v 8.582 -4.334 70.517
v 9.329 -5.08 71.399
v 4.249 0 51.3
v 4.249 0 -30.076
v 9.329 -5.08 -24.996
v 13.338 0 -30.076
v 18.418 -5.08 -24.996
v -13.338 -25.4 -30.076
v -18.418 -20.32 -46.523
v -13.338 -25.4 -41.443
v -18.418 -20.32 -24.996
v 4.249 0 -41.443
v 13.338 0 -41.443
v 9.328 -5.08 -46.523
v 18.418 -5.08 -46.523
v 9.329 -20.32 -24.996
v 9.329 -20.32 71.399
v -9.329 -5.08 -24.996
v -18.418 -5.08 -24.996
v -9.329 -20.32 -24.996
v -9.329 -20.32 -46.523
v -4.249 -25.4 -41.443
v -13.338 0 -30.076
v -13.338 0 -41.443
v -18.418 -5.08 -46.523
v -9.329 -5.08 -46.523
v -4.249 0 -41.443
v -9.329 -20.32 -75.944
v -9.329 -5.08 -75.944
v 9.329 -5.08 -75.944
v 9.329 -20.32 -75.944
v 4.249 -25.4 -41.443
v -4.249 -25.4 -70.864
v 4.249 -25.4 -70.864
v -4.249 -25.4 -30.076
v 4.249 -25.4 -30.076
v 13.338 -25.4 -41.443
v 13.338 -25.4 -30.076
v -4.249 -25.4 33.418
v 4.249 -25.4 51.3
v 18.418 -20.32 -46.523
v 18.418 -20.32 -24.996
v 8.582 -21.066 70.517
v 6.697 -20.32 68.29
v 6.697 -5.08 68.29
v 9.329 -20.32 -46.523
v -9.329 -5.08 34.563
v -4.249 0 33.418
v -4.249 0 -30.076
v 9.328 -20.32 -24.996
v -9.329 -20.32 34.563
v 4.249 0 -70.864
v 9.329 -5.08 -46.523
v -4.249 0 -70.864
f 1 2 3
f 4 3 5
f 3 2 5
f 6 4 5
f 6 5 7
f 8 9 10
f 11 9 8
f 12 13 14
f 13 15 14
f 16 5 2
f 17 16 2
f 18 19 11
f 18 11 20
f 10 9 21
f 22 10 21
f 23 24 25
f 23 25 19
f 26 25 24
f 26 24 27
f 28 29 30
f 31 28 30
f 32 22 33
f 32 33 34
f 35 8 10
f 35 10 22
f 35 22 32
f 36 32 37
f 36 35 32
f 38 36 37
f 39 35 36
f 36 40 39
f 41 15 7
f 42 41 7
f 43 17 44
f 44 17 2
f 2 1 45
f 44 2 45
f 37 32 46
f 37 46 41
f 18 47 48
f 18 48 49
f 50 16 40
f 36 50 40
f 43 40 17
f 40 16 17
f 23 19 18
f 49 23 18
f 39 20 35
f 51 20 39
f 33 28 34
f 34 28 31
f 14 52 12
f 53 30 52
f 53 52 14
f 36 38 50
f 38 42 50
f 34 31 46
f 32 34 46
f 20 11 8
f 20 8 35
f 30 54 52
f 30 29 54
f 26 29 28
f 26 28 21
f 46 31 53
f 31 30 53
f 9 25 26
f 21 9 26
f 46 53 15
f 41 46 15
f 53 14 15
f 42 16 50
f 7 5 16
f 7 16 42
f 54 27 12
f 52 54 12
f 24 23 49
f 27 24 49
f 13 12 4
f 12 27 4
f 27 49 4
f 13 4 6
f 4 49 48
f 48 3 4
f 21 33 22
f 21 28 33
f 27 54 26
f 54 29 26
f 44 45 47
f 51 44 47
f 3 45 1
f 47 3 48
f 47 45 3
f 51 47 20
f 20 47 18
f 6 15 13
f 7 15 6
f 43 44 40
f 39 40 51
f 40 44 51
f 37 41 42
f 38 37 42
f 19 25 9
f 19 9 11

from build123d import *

# Parameters (mm, degrees)
F0_W        = 9.0893283486
F0_H        = 21.5273555368
F0_W_2      = 9.3285199255
F0_H_2      = 29.4207185507
F1_DEPTH    = 25.4
F2_R        = 9.5587418967
F3_DEPTH    = 25.4
F4_C1_SIZE  = 5.08
F4_C2_SIZE  = 5.08
F4_C3_SIZE  = 5.08
F4_C4_SIZE  = 5.08
F4_C5_SIZE  = 5.08
F4_C6_SIZE  = 5.0799
F4_C7_SIZE  = 5.08
F4_C8_SIZE  = 5.08
F4_C9_SIZE  = 5.08
F4_C10_SIZE = 5.08
F4_C11_SIZE = 5.08
F4_C12_SIZE = 5.08
F5_C1_SIZE  = 5.08
F5_C2_SIZE  = 5.08
F5_C3_SIZE  = 5.08
F5_C4_SIZE  = 5.08
F5_C5_SIZE  = 5.08
F5_C6_SIZE  = 5.08
F5_C7_SIZE  = 5.08
F5_C8_SIZE  = 5.08
F5_C9_SIZE  = 5.08
F5_C10_SIZE = 5.08
F5_C11_SIZE = 5.0799
F5_C12_SIZE = 5.08


# Not quite as in the source:
# - a fillet or chamfer is up to 0.001 mm smaller than in the source, because OpenCascade refuses the exact size


with BuildPart() as f1:
    # F0 (on Front) → F1 (new body)
    with BuildSketch(Plane.XZ):
        with Locations((-13.8731840998, -35.7593270019)):
            Rectangle(F0_W, F0_H)
        Polygon((-9.3285199255, -24.9956492335), (-9.3285199255, -46.5230047703), (0, -46.5230047703), (9.3285199255, -46.5230047703), (9.3285199255, -24.9956492335), (9.3285199255, 34.5633625984), (9.3285199255, 71.3990554214), (6.6973981448, 68.2895556092), (-9.3285199255, 34.5633625984), align=None)
        with Locations((13.8731840998, -35.7593270019)):
            Rectangle(F0_W, F0_H)
        with Locations((-4.6642599627, -61.2333640456)):
            Rectangle(F0_W_2, F0_H_2)
        with Locations((4.6642599627, -61.2333640456)):
            Rectangle(F0_W_2, F0_H_2)
    extrude(amount=F1_DEPTH)

    # F2 (on Front) → F3 (join)
    with BuildSketch(Plane.XZ):
        with Locations((0, -37.1944867074)):
            Circle(F2_R)
    extrude(amount=F3_DEPTH)

    # F4: chamfer of 5.08 on 13 edges, made by hand

    # F4_c1
    f4_c1_edges = [f1.edges().sort_by_distance(p)[0] for p in [
        (-13.8731840998, 0, -46.5230047703),
    ]]
    chamfer(f4_c1_edges, length=F4_C1_SIZE)

    # F4_c2
    f4_c2_edges = [f1.edges().sort_by_distance(p)[0] for p in [
        (-18.4178482741, 0, -33.2193270019),
    ]]
    chamfer(f4_c2_edges, length=F4_C2_SIZE)

    # F4_c3
    f4_c3_edges = [f1.edges().sort_by_distance(p)[0] for p in [
        (-9.3285199255, 0, -61.2333640456),
    ]]
    chamfer(f4_c3_edges, length=F4_C3_SIZE)

    # F4_c4
    f4_c4_edges = [f1.edges().sort_by_distance(p)[0] for p in [
        (2.54, 0, -75.943723321),
    ]]
    chamfer(f4_c4_edges, length=F4_C4_SIZE)

    # F4_c5
    f4_c5_edges = [f1.edges().sort_by_distance(p)[0] for p in [
        (9.3285199255, 0, -58.6933640456),
    ]]
    chamfer(f4_c5_edges, length=F4_C5_SIZE)

    # F4_c6 (size 5.08 in the source; OpenCascade refuses exactly that, so slightly less here)
    f4_c6_edges = [f1.edges().sort_by_distance(p)[0] for p in [
        (13.8731840998, 0, -46.5230047703),
    ]]
    chamfer(f4_c6_edges, length=F4_C6_SIZE)

    # F4_c7
    f4_c7_edges = [f1.edges().sort_by_distance(p)[0] for p in [
        (18.4178482741, 0, -33.2193770019),
    ]]
    chamfer(f4_c7_edges, length=F4_C7_SIZE)

    # F4_c8
    f4_c8_edges = [f1.edges().sort_by_distance(p)[0] for p in [
        (11.3331840998, 0, -24.9956492335),
    ]]
    chamfer(f4_c8_edges, length=F4_C8_SIZE)

    # F4_c9
    f4_c9_edges = [f1.edges().sort_by_distance(p)[0] for p in [
        (9.3285199255, 0, 23.2017030939),
    ]]
    chamfer(f4_c9_edges, length=F4_C9_SIZE)

    # F4_c10
    f4_c10_edges = [f1.edges().sort_by_distance(p)[0] for p in [
        (-2.54, 0, 48.8496538587),
    ]]
    chamfer(f4_c10_edges, length=F4_C10_SIZE)

    # F4_c11
    f4_c11_edges = [f1.edges().sort_by_distance(p)[0] for p in [
        (-9.3285199255, 0, -1.1343040268),
    ]]
    chamfer(f4_c11_edges, length=F4_C11_SIZE)

    # F4_c12
    f4_c12_edges = [f1.edges().sort_by_distance(p)[0] for p in [
        (-11.3331840998, 0, -24.9956492335),
    ]]
    chamfer(f4_c12_edges, length=F4_C12_SIZE)

    # F5: chamfer of 5.08 on 13 edges, made by hand

    # F5_c1
    f5_c1_edges = [f1.edges().sort_by_distance(p)[0] for p in [
        (-18.4178482741, -25.4, -35.7593270019),
    ]]
    chamfer(f5_c1_edges, length=F5_C1_SIZE)

    # F5_c2
    f5_c2_edges = [f1.edges().sort_by_distance(p)[0] for p in [
        (-11.3331840998, -25.4, -24.9956492335),
    ]]
    chamfer(f5_c2_edges, length=F5_C2_SIZE)

    # F5_c3
    f5_c3_edges = [f1.edges().sort_by_distance(p)[0] for p in [
        (-11.3331840998, -25.4, -46.5230047703),
    ]]
    chamfer(f5_c3_edges, length=F5_C3_SIZE)

    # F5_c4
    f5_c4_edges = [f1.edges().sort_by_distance(p)[0] for p in [
        (-9.3285199255, -25.4, 4.7838566825),
    ]]
    chamfer(f5_c4_edges, length=F5_C4_SIZE)

    # F5_c5
    f5_c5_edges = [f1.edges().sort_by_distance(p)[0] for p in [
        (-9.3285199255, -25.4, -61.2333640456),
    ]]
    chamfer(f5_c5_edges, length=F5_C5_SIZE)

    # F5_c6
    f5_c6_edges = [f1.edges().sort_by_distance(p)[0] for p in [
        (1.2244391096, -25.4, 56.7718333827),
    ]]
    chamfer(f5_c6_edges, length=F5_C6_SIZE)

    # F5_c7
    f5_c7_edges = [f1.edges().sort_by_distance(p)[0] for p in [
        (2.54, -25.4, -75.943723321),
    ]]
    chamfer(f5_c7_edges, length=F5_C7_SIZE)

    # F5_c8
    f5_c8_edges = [f1.edges().sort_by_distance(p)[0] for p in [
        (9.3285199255, -25.4, 18.4973615123),
    ]]
    chamfer(f5_c8_edges, length=F5_C8_SIZE)

    # F5_c9
    f5_c9_edges = [f1.edges().sort_by_distance(p)[0] for p in [
        (13.8731840998, -25.4, -46.5230047703),
    ]]
    chamfer(f5_c9_edges, length=F5_C9_SIZE)

    # F5_c10
    f5_c10_edges = [f1.edges().sort_by_distance(p)[0] for p in [
        (9.3285199255, -25.4, -58.6933640456),
    ]]
    chamfer(f5_c10_edges, length=F5_C10_SIZE)

    # F5_c11 (size 5.08 in the source; OpenCascade refuses exactly that, so slightly less here)
    f5_c11_edges = [f1.edges().sort_by_distance(p)[0] for p in [
        (13.8731840998, -25.4, -24.9956492335),
    ]]
    chamfer(f5_c11_edges, length=F5_C11_SIZE)

    # F5_c12
    f5_c12_edges = [f1.edges().sort_by_distance(p)[0] for p in [
        (18.4178482741, -25.4, -35.7592770019),
    ]]
    chamfer(f5_c12_edges, length=F5_C12_SIZE)


solid = f1.part
